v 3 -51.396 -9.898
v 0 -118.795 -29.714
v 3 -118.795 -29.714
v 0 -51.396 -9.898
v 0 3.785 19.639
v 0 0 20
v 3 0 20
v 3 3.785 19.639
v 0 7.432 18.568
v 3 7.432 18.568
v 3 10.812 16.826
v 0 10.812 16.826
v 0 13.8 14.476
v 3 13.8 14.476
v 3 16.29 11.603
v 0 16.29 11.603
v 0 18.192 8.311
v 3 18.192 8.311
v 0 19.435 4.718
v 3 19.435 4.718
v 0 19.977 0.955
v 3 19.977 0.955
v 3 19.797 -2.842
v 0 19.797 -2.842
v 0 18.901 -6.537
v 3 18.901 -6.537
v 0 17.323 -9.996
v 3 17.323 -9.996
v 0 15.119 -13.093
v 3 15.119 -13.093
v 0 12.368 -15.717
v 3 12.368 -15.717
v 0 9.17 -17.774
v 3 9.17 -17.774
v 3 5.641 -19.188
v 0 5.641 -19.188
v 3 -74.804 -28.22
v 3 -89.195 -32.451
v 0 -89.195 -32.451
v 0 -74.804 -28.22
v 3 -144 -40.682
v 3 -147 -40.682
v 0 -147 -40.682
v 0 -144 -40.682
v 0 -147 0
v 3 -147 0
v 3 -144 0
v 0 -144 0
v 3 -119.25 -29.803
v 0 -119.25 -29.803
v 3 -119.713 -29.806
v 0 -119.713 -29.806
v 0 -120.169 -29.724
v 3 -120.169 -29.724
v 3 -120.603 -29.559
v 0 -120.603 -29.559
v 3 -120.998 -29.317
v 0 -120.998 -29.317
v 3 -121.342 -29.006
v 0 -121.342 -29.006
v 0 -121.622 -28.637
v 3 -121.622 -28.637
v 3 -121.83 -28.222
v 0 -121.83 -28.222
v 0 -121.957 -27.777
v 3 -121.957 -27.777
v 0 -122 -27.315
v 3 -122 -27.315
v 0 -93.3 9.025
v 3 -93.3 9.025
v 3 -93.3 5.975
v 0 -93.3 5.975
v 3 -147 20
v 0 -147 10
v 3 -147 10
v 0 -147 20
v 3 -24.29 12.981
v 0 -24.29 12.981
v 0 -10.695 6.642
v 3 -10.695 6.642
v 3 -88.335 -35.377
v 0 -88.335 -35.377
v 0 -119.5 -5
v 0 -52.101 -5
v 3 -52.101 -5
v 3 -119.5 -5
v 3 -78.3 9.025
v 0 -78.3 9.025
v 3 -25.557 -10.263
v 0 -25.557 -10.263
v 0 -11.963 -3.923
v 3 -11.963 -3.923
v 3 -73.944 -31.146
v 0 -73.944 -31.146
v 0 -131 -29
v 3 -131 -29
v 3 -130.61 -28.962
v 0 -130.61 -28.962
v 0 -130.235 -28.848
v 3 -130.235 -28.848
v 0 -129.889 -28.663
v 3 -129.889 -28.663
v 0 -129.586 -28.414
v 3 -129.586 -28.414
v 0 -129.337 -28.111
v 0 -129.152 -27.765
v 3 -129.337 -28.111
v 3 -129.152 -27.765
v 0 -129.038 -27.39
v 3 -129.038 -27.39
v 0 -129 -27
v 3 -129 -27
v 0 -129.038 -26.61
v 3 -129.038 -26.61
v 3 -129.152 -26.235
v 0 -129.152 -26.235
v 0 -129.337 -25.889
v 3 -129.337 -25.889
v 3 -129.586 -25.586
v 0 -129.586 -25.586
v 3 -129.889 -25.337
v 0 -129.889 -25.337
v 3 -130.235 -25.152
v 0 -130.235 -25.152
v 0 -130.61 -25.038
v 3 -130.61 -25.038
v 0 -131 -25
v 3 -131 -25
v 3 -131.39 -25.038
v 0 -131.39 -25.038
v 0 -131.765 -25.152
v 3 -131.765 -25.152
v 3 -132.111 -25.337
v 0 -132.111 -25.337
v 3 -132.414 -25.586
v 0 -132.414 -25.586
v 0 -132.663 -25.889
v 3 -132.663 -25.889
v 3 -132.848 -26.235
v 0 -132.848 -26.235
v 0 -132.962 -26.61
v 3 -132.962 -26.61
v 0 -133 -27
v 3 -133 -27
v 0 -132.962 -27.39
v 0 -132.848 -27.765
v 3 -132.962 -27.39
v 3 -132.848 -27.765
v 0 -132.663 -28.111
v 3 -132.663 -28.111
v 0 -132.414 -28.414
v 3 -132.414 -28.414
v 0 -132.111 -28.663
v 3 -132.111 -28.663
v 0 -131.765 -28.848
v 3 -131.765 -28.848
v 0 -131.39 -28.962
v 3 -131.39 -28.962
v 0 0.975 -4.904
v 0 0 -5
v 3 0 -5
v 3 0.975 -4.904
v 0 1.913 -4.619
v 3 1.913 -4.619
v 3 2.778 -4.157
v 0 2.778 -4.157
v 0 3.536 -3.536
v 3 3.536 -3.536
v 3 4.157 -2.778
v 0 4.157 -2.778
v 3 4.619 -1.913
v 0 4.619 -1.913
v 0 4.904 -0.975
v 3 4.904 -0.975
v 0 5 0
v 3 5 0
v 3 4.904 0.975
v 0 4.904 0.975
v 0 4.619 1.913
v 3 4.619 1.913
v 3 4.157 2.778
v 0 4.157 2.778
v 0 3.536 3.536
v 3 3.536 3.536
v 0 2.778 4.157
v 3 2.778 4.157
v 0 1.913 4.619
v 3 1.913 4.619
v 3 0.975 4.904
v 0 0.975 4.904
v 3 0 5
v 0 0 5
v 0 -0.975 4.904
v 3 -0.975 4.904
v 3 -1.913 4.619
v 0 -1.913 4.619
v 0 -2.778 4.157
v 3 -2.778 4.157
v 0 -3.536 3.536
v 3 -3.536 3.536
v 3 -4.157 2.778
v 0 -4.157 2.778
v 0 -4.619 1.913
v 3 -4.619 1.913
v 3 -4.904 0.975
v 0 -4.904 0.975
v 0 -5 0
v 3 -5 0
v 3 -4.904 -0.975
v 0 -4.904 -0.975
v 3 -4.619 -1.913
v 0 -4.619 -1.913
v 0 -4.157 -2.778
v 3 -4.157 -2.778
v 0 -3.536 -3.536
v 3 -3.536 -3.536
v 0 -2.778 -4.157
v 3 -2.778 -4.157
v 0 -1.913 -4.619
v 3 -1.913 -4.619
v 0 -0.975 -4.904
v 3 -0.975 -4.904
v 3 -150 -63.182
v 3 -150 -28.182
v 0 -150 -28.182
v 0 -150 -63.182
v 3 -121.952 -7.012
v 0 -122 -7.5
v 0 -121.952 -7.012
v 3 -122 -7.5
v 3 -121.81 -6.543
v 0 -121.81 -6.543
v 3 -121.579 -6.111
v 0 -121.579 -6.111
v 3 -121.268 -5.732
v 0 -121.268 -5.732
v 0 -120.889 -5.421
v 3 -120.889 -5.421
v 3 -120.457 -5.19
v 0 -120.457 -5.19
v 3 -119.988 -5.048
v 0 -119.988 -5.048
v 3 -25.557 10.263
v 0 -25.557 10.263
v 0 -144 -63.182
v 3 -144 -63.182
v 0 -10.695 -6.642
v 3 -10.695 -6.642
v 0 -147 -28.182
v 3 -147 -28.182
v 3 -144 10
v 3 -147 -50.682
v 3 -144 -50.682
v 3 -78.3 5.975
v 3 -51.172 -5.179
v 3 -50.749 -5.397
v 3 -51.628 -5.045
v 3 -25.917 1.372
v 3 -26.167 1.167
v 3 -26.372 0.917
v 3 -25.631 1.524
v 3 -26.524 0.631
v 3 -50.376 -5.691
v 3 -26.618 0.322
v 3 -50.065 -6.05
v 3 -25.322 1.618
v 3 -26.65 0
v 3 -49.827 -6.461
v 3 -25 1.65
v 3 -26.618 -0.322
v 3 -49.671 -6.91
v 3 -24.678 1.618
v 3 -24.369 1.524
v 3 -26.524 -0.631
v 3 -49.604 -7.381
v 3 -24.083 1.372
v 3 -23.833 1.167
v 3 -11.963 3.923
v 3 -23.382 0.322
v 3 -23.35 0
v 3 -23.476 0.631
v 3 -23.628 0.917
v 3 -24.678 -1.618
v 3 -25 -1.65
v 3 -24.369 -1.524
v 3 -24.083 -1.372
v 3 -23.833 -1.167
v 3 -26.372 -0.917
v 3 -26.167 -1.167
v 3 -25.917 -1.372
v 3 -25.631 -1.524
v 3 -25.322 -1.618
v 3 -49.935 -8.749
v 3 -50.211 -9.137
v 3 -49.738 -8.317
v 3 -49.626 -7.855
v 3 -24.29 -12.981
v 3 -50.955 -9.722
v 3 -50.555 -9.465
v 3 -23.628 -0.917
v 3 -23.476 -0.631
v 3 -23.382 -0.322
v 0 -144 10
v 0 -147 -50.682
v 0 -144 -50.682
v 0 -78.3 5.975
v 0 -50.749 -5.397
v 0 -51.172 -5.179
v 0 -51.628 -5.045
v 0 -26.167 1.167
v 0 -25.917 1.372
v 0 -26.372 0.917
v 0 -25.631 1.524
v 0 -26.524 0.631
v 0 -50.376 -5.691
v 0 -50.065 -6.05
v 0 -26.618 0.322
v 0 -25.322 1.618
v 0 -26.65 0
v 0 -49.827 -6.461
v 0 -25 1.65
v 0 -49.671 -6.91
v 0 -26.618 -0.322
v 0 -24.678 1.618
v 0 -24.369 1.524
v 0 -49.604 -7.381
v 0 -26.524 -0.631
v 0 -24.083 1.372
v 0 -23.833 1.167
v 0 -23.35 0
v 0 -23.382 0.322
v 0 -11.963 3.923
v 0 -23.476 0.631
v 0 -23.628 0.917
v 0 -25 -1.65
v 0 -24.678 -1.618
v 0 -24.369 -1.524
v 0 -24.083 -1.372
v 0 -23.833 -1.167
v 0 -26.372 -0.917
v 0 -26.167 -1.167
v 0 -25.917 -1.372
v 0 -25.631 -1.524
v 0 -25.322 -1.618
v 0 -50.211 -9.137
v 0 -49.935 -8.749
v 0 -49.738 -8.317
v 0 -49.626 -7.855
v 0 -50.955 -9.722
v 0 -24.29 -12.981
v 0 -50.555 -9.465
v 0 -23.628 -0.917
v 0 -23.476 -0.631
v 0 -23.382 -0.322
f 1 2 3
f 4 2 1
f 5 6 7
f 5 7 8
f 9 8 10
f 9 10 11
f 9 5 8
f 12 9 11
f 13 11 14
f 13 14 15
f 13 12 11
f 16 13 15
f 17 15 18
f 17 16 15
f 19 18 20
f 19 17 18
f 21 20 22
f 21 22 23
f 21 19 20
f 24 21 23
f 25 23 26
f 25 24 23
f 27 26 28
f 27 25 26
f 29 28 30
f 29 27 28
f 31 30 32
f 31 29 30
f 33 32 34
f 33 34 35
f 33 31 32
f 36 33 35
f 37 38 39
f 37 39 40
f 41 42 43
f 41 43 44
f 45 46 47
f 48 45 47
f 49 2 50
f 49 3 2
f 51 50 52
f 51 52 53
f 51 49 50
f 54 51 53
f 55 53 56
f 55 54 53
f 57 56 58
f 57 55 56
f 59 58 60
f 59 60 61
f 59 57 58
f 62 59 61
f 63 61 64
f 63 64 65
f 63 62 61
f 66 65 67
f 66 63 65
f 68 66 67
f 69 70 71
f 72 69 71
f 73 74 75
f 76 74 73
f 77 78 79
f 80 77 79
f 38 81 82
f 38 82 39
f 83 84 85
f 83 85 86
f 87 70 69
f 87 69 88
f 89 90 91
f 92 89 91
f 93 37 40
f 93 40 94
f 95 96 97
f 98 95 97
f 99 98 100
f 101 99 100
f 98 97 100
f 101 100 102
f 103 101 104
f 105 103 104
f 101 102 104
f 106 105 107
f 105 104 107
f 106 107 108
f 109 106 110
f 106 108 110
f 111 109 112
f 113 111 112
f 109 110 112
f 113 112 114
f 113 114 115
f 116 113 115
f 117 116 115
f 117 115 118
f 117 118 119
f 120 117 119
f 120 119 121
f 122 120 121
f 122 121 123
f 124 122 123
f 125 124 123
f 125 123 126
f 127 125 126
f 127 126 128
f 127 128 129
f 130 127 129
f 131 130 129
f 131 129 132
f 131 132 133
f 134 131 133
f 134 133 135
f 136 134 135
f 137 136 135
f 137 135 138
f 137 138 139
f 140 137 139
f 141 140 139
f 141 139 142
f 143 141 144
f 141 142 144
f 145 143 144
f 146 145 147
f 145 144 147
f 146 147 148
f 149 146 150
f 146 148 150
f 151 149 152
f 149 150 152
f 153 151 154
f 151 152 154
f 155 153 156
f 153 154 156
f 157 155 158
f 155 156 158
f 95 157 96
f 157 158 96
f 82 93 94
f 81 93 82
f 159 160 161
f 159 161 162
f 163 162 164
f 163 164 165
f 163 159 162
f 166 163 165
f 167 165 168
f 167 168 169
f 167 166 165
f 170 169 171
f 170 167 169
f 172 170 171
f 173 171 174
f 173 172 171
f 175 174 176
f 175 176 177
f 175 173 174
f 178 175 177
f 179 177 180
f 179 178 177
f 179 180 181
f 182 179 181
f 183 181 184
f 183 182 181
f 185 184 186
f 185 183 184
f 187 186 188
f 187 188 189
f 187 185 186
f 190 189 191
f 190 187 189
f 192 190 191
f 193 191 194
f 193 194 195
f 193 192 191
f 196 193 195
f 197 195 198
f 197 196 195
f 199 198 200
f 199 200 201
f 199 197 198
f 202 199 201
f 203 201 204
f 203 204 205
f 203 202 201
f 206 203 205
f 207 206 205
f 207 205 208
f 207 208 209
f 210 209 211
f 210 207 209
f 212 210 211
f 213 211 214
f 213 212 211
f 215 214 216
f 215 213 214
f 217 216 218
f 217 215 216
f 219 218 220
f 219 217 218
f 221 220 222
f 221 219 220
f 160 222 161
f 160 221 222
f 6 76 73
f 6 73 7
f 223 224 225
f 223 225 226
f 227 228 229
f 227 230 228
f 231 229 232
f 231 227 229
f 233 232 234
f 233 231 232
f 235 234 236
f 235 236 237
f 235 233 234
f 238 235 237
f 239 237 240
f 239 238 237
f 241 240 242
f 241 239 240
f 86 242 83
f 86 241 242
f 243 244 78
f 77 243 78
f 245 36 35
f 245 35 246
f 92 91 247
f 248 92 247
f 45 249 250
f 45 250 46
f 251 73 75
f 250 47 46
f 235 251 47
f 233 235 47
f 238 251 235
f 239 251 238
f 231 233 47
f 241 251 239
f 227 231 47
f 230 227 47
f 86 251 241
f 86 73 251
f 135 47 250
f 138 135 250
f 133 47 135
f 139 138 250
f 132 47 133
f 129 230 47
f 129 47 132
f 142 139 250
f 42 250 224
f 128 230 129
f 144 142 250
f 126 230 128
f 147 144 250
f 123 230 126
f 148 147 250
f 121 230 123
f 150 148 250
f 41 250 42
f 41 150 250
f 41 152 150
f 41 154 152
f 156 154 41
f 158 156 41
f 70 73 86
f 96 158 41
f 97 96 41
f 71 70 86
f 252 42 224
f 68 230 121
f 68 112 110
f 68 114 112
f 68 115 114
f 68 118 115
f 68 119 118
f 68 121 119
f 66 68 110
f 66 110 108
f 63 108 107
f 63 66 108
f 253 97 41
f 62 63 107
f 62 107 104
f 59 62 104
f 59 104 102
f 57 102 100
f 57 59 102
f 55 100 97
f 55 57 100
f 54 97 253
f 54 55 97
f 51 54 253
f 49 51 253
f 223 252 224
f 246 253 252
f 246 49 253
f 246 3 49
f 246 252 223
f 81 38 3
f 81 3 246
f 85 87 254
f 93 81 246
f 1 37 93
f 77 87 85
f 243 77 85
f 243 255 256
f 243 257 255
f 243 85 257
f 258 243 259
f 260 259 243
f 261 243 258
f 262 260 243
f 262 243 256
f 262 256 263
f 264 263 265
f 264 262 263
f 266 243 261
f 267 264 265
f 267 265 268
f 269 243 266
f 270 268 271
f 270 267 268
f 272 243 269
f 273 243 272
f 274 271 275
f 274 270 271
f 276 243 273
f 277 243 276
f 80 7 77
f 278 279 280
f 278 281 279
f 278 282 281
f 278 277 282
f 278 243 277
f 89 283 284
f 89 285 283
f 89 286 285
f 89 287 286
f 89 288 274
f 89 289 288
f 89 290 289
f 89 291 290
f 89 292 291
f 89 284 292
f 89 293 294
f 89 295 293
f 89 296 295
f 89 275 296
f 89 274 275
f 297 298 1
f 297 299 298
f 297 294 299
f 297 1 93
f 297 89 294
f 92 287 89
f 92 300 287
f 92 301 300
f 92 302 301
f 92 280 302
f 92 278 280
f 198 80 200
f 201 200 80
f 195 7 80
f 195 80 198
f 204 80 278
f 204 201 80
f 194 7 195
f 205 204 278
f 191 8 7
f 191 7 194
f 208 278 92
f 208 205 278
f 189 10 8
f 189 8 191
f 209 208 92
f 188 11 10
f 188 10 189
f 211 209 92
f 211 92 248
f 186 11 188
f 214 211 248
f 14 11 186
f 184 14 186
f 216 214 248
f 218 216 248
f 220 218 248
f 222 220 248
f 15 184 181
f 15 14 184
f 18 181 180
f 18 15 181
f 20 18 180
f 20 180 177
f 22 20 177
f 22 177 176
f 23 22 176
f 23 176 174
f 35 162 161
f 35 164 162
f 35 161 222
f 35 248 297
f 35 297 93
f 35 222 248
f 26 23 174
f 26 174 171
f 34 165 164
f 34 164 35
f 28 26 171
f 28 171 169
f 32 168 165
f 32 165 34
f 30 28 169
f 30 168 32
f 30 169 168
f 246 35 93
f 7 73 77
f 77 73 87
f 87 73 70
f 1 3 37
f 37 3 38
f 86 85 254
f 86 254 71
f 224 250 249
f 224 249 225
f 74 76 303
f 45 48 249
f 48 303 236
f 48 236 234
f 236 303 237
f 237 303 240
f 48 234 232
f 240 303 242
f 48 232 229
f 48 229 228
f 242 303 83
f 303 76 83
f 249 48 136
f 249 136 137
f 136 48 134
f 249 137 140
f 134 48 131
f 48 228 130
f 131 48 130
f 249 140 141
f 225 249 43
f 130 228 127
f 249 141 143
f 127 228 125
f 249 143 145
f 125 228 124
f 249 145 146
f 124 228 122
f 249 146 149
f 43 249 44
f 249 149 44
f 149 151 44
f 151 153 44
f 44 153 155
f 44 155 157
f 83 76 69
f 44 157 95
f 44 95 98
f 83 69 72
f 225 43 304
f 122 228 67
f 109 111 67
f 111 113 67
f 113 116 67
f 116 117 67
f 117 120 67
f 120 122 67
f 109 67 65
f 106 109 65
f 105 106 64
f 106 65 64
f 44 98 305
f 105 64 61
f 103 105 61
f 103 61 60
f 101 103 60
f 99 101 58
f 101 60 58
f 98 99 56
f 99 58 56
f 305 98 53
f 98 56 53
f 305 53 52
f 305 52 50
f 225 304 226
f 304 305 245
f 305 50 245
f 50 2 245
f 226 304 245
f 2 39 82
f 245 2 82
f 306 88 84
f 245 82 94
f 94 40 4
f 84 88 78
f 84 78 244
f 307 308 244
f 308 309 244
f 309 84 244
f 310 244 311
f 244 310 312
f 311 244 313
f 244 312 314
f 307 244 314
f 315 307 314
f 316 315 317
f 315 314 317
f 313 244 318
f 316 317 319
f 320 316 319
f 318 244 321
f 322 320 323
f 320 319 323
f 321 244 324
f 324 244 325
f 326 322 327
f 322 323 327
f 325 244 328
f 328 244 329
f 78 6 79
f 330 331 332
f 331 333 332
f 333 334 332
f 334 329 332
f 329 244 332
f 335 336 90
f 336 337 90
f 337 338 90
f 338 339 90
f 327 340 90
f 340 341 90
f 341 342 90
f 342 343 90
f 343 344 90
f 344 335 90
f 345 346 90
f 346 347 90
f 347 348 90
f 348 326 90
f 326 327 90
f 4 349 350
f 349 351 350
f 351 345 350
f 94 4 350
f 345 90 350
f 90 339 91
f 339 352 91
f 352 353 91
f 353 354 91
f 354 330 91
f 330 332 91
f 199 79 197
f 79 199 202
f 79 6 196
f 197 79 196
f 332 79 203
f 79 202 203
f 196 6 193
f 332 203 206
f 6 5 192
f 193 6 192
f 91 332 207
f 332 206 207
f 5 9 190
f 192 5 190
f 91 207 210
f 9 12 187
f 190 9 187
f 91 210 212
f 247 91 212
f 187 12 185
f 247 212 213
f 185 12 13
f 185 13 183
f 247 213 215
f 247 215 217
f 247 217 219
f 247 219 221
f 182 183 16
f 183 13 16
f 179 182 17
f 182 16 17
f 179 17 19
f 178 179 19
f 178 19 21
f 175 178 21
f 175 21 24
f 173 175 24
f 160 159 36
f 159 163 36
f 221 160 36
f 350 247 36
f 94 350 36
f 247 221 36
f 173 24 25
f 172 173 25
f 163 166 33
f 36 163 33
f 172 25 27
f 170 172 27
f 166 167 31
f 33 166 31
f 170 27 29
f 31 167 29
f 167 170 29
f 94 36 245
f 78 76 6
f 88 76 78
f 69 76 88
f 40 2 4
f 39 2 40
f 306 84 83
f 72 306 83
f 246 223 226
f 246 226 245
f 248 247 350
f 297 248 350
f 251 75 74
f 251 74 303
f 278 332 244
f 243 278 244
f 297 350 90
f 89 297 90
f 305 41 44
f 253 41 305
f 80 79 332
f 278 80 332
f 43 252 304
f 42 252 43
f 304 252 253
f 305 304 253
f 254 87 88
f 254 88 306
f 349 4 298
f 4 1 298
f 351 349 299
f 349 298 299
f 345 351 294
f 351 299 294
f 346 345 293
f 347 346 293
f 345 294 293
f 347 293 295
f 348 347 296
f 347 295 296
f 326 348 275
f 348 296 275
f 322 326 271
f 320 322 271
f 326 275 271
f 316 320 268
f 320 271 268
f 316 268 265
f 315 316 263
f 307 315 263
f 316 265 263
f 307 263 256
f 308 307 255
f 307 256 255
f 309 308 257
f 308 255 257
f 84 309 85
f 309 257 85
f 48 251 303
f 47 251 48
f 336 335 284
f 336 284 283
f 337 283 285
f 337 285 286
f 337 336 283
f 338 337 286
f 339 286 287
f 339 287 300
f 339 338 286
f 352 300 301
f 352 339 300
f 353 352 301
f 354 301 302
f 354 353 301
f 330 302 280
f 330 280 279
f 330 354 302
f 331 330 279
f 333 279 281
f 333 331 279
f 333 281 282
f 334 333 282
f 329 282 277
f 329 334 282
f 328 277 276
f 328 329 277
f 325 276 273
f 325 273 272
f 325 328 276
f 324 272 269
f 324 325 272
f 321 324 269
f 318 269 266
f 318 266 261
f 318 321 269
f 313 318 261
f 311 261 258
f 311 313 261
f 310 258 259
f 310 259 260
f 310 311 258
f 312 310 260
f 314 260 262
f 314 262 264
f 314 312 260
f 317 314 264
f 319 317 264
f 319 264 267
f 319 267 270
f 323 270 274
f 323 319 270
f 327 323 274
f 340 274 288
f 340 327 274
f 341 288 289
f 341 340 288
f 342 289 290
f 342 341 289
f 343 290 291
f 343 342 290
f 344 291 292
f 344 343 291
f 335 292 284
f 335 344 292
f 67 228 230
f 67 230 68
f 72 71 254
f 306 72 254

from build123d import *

# Parameters (mm, degrees)
SKETCH1_R               = 5
SKETCH1_R_2             = 1.65
BOSS_EXTRUDE1_DEPTH     = 3
FILLET1_R               = 2.5
SKETCH2_W               = 10
SKETCH2_H               = 3
CUT_EXTRUDE1_DEPTH      = 1
CUT_EXTRUDE1_DEPTH_BACK = 4
BOSS_EXTRUDE2_DEPTH     = 3
SKETCH4_R               = 2
SKETCH4_W               = 3.05
SKETCH4_H               = 15
CUT_EXTRUDE2_DEPTH      = 1
CUT_EXTRUDE2_DEPTH_BACK = 4


with BuildPart() as part:
    # Sketch1 → Boss-Extrude1 (new body)
    with BuildSketch(Plane(origin=(0, 0, 0), x_dir=(0, 0, -1), z_dir=(1, 0, 0))):
        with BuildLine():
            Line((-20, -147), (-20, 0))
            ThreePointArc((-20, 0), (-2.849659193, 19.795945102), (19.187944249, 5.641169694))
            Line((19.187944249, 5.641169694), (63.181778112, -144))
            Line((63.181778112, -144), (63.181778112, -147))
            Line((63.181778112, -147), (-20, -147))
        make_face()
        Circle(SKETCH1_R, mode=Mode.SUBTRACT)
        with Locations((0, -25)):
            Circle(SKETCH1_R_2, mode=Mode.SUBTRACT)
        Polygon((5, -34.733881779), (5, -122), (30.655848018, -122), align=None, mode=Mode.SUBTRACT)
        Polygon((10.262540517, -25.557391536), (3.923266591, -11.962774731), (6.642189952, -10.694919945), (12.981463878, -24.289536751), align=None, mode=Mode.SUBTRACT)
        Polygon((-12.981463878, -24.289536751), (-6.642189952, -10.694919945), (-3.923266591, -11.962774731), (-10.262540517, -25.557391536), align=None, mode=Mode.SUBTRACT)
    extrude(amount=BOSS_EXTRUDE1_DEPTH)

    # Fillet1
    fillet1_edges = [part.edges().sort_by_distance(p)[0] for p in [
        (1.5, -122, -30.655848018),
        (1.5, -34.733881779, -5),
        (1.5, -122, -5),
    ]]
    fillet(fillet1_edges, radius=FILLET1_R)

    # Sketch2 → Cut-Extrude1 (cut, two sides)
    with BuildSketch(Plane(origin=(3, 0, 0), x_dir=(0, 0, -1), z_dir=(1, 0, 0))) as cut_extrude1_sk:
        with Locations((45.681778112, -145.5)):
            Rectangle(SKETCH2_W, SKETCH2_H)
        with Locations((-5, -145.5)):
            Rectangle(SKETCH2_W, SKETCH2_H)
    extrude(amount=CUT_EXTRUDE1_DEPTH, mode=Mode.SUBTRACT)
    extrude(cut_extrude1_sk.sketch, amount=-CUT_EXTRUDE1_DEPTH_BACK, mode=Mode.SUBTRACT)

    # Sketch2<3> → Boss-Extrude2 (add)
    with BuildSketch(Plane(origin=(3, 0, 0), x_dir=(0, 0, -1), z_dir=(1, 0, 0))):
        Polygon((50.681778112, -147), (40.681778112, -147), (28.181778112, -147), (28.181778112, -150), (63.181778112, -150), (63.181778112, -147), align=None)
    extrude(amount=-BOSS_EXTRUDE2_DEPTH)

    # Sketch4 → Cut-Extrude2 (cut, two sides)
    with BuildSketch(Plane(origin=(3, 0, 0), x_dir=(0, 0, -1), z_dir=(1, 0, 0))) as cut_extrude2_sk:
        with Locations((27, -131)):
            Circle(SKETCH4_R)
        Polygon((32.450844249, -89.195152346), (28.219966978, -74.804194159), (31.146128476, -73.943915781), (35.377005747, -88.334873967), align=None)
        with Locations((-7.5, -85.800411334)):
            Rectangle(SKETCH4_W, SKETCH4_H)
    extrude(amount=CUT_EXTRUDE2_DEPTH, mode=Mode.SUBTRACT)
    extrude(cut_extrude2_sk.sketch, amount=-CUT_EXTRUDE2_DEPTH_BACK, mode=Mode.SUBTRACT)


solid = part.part
